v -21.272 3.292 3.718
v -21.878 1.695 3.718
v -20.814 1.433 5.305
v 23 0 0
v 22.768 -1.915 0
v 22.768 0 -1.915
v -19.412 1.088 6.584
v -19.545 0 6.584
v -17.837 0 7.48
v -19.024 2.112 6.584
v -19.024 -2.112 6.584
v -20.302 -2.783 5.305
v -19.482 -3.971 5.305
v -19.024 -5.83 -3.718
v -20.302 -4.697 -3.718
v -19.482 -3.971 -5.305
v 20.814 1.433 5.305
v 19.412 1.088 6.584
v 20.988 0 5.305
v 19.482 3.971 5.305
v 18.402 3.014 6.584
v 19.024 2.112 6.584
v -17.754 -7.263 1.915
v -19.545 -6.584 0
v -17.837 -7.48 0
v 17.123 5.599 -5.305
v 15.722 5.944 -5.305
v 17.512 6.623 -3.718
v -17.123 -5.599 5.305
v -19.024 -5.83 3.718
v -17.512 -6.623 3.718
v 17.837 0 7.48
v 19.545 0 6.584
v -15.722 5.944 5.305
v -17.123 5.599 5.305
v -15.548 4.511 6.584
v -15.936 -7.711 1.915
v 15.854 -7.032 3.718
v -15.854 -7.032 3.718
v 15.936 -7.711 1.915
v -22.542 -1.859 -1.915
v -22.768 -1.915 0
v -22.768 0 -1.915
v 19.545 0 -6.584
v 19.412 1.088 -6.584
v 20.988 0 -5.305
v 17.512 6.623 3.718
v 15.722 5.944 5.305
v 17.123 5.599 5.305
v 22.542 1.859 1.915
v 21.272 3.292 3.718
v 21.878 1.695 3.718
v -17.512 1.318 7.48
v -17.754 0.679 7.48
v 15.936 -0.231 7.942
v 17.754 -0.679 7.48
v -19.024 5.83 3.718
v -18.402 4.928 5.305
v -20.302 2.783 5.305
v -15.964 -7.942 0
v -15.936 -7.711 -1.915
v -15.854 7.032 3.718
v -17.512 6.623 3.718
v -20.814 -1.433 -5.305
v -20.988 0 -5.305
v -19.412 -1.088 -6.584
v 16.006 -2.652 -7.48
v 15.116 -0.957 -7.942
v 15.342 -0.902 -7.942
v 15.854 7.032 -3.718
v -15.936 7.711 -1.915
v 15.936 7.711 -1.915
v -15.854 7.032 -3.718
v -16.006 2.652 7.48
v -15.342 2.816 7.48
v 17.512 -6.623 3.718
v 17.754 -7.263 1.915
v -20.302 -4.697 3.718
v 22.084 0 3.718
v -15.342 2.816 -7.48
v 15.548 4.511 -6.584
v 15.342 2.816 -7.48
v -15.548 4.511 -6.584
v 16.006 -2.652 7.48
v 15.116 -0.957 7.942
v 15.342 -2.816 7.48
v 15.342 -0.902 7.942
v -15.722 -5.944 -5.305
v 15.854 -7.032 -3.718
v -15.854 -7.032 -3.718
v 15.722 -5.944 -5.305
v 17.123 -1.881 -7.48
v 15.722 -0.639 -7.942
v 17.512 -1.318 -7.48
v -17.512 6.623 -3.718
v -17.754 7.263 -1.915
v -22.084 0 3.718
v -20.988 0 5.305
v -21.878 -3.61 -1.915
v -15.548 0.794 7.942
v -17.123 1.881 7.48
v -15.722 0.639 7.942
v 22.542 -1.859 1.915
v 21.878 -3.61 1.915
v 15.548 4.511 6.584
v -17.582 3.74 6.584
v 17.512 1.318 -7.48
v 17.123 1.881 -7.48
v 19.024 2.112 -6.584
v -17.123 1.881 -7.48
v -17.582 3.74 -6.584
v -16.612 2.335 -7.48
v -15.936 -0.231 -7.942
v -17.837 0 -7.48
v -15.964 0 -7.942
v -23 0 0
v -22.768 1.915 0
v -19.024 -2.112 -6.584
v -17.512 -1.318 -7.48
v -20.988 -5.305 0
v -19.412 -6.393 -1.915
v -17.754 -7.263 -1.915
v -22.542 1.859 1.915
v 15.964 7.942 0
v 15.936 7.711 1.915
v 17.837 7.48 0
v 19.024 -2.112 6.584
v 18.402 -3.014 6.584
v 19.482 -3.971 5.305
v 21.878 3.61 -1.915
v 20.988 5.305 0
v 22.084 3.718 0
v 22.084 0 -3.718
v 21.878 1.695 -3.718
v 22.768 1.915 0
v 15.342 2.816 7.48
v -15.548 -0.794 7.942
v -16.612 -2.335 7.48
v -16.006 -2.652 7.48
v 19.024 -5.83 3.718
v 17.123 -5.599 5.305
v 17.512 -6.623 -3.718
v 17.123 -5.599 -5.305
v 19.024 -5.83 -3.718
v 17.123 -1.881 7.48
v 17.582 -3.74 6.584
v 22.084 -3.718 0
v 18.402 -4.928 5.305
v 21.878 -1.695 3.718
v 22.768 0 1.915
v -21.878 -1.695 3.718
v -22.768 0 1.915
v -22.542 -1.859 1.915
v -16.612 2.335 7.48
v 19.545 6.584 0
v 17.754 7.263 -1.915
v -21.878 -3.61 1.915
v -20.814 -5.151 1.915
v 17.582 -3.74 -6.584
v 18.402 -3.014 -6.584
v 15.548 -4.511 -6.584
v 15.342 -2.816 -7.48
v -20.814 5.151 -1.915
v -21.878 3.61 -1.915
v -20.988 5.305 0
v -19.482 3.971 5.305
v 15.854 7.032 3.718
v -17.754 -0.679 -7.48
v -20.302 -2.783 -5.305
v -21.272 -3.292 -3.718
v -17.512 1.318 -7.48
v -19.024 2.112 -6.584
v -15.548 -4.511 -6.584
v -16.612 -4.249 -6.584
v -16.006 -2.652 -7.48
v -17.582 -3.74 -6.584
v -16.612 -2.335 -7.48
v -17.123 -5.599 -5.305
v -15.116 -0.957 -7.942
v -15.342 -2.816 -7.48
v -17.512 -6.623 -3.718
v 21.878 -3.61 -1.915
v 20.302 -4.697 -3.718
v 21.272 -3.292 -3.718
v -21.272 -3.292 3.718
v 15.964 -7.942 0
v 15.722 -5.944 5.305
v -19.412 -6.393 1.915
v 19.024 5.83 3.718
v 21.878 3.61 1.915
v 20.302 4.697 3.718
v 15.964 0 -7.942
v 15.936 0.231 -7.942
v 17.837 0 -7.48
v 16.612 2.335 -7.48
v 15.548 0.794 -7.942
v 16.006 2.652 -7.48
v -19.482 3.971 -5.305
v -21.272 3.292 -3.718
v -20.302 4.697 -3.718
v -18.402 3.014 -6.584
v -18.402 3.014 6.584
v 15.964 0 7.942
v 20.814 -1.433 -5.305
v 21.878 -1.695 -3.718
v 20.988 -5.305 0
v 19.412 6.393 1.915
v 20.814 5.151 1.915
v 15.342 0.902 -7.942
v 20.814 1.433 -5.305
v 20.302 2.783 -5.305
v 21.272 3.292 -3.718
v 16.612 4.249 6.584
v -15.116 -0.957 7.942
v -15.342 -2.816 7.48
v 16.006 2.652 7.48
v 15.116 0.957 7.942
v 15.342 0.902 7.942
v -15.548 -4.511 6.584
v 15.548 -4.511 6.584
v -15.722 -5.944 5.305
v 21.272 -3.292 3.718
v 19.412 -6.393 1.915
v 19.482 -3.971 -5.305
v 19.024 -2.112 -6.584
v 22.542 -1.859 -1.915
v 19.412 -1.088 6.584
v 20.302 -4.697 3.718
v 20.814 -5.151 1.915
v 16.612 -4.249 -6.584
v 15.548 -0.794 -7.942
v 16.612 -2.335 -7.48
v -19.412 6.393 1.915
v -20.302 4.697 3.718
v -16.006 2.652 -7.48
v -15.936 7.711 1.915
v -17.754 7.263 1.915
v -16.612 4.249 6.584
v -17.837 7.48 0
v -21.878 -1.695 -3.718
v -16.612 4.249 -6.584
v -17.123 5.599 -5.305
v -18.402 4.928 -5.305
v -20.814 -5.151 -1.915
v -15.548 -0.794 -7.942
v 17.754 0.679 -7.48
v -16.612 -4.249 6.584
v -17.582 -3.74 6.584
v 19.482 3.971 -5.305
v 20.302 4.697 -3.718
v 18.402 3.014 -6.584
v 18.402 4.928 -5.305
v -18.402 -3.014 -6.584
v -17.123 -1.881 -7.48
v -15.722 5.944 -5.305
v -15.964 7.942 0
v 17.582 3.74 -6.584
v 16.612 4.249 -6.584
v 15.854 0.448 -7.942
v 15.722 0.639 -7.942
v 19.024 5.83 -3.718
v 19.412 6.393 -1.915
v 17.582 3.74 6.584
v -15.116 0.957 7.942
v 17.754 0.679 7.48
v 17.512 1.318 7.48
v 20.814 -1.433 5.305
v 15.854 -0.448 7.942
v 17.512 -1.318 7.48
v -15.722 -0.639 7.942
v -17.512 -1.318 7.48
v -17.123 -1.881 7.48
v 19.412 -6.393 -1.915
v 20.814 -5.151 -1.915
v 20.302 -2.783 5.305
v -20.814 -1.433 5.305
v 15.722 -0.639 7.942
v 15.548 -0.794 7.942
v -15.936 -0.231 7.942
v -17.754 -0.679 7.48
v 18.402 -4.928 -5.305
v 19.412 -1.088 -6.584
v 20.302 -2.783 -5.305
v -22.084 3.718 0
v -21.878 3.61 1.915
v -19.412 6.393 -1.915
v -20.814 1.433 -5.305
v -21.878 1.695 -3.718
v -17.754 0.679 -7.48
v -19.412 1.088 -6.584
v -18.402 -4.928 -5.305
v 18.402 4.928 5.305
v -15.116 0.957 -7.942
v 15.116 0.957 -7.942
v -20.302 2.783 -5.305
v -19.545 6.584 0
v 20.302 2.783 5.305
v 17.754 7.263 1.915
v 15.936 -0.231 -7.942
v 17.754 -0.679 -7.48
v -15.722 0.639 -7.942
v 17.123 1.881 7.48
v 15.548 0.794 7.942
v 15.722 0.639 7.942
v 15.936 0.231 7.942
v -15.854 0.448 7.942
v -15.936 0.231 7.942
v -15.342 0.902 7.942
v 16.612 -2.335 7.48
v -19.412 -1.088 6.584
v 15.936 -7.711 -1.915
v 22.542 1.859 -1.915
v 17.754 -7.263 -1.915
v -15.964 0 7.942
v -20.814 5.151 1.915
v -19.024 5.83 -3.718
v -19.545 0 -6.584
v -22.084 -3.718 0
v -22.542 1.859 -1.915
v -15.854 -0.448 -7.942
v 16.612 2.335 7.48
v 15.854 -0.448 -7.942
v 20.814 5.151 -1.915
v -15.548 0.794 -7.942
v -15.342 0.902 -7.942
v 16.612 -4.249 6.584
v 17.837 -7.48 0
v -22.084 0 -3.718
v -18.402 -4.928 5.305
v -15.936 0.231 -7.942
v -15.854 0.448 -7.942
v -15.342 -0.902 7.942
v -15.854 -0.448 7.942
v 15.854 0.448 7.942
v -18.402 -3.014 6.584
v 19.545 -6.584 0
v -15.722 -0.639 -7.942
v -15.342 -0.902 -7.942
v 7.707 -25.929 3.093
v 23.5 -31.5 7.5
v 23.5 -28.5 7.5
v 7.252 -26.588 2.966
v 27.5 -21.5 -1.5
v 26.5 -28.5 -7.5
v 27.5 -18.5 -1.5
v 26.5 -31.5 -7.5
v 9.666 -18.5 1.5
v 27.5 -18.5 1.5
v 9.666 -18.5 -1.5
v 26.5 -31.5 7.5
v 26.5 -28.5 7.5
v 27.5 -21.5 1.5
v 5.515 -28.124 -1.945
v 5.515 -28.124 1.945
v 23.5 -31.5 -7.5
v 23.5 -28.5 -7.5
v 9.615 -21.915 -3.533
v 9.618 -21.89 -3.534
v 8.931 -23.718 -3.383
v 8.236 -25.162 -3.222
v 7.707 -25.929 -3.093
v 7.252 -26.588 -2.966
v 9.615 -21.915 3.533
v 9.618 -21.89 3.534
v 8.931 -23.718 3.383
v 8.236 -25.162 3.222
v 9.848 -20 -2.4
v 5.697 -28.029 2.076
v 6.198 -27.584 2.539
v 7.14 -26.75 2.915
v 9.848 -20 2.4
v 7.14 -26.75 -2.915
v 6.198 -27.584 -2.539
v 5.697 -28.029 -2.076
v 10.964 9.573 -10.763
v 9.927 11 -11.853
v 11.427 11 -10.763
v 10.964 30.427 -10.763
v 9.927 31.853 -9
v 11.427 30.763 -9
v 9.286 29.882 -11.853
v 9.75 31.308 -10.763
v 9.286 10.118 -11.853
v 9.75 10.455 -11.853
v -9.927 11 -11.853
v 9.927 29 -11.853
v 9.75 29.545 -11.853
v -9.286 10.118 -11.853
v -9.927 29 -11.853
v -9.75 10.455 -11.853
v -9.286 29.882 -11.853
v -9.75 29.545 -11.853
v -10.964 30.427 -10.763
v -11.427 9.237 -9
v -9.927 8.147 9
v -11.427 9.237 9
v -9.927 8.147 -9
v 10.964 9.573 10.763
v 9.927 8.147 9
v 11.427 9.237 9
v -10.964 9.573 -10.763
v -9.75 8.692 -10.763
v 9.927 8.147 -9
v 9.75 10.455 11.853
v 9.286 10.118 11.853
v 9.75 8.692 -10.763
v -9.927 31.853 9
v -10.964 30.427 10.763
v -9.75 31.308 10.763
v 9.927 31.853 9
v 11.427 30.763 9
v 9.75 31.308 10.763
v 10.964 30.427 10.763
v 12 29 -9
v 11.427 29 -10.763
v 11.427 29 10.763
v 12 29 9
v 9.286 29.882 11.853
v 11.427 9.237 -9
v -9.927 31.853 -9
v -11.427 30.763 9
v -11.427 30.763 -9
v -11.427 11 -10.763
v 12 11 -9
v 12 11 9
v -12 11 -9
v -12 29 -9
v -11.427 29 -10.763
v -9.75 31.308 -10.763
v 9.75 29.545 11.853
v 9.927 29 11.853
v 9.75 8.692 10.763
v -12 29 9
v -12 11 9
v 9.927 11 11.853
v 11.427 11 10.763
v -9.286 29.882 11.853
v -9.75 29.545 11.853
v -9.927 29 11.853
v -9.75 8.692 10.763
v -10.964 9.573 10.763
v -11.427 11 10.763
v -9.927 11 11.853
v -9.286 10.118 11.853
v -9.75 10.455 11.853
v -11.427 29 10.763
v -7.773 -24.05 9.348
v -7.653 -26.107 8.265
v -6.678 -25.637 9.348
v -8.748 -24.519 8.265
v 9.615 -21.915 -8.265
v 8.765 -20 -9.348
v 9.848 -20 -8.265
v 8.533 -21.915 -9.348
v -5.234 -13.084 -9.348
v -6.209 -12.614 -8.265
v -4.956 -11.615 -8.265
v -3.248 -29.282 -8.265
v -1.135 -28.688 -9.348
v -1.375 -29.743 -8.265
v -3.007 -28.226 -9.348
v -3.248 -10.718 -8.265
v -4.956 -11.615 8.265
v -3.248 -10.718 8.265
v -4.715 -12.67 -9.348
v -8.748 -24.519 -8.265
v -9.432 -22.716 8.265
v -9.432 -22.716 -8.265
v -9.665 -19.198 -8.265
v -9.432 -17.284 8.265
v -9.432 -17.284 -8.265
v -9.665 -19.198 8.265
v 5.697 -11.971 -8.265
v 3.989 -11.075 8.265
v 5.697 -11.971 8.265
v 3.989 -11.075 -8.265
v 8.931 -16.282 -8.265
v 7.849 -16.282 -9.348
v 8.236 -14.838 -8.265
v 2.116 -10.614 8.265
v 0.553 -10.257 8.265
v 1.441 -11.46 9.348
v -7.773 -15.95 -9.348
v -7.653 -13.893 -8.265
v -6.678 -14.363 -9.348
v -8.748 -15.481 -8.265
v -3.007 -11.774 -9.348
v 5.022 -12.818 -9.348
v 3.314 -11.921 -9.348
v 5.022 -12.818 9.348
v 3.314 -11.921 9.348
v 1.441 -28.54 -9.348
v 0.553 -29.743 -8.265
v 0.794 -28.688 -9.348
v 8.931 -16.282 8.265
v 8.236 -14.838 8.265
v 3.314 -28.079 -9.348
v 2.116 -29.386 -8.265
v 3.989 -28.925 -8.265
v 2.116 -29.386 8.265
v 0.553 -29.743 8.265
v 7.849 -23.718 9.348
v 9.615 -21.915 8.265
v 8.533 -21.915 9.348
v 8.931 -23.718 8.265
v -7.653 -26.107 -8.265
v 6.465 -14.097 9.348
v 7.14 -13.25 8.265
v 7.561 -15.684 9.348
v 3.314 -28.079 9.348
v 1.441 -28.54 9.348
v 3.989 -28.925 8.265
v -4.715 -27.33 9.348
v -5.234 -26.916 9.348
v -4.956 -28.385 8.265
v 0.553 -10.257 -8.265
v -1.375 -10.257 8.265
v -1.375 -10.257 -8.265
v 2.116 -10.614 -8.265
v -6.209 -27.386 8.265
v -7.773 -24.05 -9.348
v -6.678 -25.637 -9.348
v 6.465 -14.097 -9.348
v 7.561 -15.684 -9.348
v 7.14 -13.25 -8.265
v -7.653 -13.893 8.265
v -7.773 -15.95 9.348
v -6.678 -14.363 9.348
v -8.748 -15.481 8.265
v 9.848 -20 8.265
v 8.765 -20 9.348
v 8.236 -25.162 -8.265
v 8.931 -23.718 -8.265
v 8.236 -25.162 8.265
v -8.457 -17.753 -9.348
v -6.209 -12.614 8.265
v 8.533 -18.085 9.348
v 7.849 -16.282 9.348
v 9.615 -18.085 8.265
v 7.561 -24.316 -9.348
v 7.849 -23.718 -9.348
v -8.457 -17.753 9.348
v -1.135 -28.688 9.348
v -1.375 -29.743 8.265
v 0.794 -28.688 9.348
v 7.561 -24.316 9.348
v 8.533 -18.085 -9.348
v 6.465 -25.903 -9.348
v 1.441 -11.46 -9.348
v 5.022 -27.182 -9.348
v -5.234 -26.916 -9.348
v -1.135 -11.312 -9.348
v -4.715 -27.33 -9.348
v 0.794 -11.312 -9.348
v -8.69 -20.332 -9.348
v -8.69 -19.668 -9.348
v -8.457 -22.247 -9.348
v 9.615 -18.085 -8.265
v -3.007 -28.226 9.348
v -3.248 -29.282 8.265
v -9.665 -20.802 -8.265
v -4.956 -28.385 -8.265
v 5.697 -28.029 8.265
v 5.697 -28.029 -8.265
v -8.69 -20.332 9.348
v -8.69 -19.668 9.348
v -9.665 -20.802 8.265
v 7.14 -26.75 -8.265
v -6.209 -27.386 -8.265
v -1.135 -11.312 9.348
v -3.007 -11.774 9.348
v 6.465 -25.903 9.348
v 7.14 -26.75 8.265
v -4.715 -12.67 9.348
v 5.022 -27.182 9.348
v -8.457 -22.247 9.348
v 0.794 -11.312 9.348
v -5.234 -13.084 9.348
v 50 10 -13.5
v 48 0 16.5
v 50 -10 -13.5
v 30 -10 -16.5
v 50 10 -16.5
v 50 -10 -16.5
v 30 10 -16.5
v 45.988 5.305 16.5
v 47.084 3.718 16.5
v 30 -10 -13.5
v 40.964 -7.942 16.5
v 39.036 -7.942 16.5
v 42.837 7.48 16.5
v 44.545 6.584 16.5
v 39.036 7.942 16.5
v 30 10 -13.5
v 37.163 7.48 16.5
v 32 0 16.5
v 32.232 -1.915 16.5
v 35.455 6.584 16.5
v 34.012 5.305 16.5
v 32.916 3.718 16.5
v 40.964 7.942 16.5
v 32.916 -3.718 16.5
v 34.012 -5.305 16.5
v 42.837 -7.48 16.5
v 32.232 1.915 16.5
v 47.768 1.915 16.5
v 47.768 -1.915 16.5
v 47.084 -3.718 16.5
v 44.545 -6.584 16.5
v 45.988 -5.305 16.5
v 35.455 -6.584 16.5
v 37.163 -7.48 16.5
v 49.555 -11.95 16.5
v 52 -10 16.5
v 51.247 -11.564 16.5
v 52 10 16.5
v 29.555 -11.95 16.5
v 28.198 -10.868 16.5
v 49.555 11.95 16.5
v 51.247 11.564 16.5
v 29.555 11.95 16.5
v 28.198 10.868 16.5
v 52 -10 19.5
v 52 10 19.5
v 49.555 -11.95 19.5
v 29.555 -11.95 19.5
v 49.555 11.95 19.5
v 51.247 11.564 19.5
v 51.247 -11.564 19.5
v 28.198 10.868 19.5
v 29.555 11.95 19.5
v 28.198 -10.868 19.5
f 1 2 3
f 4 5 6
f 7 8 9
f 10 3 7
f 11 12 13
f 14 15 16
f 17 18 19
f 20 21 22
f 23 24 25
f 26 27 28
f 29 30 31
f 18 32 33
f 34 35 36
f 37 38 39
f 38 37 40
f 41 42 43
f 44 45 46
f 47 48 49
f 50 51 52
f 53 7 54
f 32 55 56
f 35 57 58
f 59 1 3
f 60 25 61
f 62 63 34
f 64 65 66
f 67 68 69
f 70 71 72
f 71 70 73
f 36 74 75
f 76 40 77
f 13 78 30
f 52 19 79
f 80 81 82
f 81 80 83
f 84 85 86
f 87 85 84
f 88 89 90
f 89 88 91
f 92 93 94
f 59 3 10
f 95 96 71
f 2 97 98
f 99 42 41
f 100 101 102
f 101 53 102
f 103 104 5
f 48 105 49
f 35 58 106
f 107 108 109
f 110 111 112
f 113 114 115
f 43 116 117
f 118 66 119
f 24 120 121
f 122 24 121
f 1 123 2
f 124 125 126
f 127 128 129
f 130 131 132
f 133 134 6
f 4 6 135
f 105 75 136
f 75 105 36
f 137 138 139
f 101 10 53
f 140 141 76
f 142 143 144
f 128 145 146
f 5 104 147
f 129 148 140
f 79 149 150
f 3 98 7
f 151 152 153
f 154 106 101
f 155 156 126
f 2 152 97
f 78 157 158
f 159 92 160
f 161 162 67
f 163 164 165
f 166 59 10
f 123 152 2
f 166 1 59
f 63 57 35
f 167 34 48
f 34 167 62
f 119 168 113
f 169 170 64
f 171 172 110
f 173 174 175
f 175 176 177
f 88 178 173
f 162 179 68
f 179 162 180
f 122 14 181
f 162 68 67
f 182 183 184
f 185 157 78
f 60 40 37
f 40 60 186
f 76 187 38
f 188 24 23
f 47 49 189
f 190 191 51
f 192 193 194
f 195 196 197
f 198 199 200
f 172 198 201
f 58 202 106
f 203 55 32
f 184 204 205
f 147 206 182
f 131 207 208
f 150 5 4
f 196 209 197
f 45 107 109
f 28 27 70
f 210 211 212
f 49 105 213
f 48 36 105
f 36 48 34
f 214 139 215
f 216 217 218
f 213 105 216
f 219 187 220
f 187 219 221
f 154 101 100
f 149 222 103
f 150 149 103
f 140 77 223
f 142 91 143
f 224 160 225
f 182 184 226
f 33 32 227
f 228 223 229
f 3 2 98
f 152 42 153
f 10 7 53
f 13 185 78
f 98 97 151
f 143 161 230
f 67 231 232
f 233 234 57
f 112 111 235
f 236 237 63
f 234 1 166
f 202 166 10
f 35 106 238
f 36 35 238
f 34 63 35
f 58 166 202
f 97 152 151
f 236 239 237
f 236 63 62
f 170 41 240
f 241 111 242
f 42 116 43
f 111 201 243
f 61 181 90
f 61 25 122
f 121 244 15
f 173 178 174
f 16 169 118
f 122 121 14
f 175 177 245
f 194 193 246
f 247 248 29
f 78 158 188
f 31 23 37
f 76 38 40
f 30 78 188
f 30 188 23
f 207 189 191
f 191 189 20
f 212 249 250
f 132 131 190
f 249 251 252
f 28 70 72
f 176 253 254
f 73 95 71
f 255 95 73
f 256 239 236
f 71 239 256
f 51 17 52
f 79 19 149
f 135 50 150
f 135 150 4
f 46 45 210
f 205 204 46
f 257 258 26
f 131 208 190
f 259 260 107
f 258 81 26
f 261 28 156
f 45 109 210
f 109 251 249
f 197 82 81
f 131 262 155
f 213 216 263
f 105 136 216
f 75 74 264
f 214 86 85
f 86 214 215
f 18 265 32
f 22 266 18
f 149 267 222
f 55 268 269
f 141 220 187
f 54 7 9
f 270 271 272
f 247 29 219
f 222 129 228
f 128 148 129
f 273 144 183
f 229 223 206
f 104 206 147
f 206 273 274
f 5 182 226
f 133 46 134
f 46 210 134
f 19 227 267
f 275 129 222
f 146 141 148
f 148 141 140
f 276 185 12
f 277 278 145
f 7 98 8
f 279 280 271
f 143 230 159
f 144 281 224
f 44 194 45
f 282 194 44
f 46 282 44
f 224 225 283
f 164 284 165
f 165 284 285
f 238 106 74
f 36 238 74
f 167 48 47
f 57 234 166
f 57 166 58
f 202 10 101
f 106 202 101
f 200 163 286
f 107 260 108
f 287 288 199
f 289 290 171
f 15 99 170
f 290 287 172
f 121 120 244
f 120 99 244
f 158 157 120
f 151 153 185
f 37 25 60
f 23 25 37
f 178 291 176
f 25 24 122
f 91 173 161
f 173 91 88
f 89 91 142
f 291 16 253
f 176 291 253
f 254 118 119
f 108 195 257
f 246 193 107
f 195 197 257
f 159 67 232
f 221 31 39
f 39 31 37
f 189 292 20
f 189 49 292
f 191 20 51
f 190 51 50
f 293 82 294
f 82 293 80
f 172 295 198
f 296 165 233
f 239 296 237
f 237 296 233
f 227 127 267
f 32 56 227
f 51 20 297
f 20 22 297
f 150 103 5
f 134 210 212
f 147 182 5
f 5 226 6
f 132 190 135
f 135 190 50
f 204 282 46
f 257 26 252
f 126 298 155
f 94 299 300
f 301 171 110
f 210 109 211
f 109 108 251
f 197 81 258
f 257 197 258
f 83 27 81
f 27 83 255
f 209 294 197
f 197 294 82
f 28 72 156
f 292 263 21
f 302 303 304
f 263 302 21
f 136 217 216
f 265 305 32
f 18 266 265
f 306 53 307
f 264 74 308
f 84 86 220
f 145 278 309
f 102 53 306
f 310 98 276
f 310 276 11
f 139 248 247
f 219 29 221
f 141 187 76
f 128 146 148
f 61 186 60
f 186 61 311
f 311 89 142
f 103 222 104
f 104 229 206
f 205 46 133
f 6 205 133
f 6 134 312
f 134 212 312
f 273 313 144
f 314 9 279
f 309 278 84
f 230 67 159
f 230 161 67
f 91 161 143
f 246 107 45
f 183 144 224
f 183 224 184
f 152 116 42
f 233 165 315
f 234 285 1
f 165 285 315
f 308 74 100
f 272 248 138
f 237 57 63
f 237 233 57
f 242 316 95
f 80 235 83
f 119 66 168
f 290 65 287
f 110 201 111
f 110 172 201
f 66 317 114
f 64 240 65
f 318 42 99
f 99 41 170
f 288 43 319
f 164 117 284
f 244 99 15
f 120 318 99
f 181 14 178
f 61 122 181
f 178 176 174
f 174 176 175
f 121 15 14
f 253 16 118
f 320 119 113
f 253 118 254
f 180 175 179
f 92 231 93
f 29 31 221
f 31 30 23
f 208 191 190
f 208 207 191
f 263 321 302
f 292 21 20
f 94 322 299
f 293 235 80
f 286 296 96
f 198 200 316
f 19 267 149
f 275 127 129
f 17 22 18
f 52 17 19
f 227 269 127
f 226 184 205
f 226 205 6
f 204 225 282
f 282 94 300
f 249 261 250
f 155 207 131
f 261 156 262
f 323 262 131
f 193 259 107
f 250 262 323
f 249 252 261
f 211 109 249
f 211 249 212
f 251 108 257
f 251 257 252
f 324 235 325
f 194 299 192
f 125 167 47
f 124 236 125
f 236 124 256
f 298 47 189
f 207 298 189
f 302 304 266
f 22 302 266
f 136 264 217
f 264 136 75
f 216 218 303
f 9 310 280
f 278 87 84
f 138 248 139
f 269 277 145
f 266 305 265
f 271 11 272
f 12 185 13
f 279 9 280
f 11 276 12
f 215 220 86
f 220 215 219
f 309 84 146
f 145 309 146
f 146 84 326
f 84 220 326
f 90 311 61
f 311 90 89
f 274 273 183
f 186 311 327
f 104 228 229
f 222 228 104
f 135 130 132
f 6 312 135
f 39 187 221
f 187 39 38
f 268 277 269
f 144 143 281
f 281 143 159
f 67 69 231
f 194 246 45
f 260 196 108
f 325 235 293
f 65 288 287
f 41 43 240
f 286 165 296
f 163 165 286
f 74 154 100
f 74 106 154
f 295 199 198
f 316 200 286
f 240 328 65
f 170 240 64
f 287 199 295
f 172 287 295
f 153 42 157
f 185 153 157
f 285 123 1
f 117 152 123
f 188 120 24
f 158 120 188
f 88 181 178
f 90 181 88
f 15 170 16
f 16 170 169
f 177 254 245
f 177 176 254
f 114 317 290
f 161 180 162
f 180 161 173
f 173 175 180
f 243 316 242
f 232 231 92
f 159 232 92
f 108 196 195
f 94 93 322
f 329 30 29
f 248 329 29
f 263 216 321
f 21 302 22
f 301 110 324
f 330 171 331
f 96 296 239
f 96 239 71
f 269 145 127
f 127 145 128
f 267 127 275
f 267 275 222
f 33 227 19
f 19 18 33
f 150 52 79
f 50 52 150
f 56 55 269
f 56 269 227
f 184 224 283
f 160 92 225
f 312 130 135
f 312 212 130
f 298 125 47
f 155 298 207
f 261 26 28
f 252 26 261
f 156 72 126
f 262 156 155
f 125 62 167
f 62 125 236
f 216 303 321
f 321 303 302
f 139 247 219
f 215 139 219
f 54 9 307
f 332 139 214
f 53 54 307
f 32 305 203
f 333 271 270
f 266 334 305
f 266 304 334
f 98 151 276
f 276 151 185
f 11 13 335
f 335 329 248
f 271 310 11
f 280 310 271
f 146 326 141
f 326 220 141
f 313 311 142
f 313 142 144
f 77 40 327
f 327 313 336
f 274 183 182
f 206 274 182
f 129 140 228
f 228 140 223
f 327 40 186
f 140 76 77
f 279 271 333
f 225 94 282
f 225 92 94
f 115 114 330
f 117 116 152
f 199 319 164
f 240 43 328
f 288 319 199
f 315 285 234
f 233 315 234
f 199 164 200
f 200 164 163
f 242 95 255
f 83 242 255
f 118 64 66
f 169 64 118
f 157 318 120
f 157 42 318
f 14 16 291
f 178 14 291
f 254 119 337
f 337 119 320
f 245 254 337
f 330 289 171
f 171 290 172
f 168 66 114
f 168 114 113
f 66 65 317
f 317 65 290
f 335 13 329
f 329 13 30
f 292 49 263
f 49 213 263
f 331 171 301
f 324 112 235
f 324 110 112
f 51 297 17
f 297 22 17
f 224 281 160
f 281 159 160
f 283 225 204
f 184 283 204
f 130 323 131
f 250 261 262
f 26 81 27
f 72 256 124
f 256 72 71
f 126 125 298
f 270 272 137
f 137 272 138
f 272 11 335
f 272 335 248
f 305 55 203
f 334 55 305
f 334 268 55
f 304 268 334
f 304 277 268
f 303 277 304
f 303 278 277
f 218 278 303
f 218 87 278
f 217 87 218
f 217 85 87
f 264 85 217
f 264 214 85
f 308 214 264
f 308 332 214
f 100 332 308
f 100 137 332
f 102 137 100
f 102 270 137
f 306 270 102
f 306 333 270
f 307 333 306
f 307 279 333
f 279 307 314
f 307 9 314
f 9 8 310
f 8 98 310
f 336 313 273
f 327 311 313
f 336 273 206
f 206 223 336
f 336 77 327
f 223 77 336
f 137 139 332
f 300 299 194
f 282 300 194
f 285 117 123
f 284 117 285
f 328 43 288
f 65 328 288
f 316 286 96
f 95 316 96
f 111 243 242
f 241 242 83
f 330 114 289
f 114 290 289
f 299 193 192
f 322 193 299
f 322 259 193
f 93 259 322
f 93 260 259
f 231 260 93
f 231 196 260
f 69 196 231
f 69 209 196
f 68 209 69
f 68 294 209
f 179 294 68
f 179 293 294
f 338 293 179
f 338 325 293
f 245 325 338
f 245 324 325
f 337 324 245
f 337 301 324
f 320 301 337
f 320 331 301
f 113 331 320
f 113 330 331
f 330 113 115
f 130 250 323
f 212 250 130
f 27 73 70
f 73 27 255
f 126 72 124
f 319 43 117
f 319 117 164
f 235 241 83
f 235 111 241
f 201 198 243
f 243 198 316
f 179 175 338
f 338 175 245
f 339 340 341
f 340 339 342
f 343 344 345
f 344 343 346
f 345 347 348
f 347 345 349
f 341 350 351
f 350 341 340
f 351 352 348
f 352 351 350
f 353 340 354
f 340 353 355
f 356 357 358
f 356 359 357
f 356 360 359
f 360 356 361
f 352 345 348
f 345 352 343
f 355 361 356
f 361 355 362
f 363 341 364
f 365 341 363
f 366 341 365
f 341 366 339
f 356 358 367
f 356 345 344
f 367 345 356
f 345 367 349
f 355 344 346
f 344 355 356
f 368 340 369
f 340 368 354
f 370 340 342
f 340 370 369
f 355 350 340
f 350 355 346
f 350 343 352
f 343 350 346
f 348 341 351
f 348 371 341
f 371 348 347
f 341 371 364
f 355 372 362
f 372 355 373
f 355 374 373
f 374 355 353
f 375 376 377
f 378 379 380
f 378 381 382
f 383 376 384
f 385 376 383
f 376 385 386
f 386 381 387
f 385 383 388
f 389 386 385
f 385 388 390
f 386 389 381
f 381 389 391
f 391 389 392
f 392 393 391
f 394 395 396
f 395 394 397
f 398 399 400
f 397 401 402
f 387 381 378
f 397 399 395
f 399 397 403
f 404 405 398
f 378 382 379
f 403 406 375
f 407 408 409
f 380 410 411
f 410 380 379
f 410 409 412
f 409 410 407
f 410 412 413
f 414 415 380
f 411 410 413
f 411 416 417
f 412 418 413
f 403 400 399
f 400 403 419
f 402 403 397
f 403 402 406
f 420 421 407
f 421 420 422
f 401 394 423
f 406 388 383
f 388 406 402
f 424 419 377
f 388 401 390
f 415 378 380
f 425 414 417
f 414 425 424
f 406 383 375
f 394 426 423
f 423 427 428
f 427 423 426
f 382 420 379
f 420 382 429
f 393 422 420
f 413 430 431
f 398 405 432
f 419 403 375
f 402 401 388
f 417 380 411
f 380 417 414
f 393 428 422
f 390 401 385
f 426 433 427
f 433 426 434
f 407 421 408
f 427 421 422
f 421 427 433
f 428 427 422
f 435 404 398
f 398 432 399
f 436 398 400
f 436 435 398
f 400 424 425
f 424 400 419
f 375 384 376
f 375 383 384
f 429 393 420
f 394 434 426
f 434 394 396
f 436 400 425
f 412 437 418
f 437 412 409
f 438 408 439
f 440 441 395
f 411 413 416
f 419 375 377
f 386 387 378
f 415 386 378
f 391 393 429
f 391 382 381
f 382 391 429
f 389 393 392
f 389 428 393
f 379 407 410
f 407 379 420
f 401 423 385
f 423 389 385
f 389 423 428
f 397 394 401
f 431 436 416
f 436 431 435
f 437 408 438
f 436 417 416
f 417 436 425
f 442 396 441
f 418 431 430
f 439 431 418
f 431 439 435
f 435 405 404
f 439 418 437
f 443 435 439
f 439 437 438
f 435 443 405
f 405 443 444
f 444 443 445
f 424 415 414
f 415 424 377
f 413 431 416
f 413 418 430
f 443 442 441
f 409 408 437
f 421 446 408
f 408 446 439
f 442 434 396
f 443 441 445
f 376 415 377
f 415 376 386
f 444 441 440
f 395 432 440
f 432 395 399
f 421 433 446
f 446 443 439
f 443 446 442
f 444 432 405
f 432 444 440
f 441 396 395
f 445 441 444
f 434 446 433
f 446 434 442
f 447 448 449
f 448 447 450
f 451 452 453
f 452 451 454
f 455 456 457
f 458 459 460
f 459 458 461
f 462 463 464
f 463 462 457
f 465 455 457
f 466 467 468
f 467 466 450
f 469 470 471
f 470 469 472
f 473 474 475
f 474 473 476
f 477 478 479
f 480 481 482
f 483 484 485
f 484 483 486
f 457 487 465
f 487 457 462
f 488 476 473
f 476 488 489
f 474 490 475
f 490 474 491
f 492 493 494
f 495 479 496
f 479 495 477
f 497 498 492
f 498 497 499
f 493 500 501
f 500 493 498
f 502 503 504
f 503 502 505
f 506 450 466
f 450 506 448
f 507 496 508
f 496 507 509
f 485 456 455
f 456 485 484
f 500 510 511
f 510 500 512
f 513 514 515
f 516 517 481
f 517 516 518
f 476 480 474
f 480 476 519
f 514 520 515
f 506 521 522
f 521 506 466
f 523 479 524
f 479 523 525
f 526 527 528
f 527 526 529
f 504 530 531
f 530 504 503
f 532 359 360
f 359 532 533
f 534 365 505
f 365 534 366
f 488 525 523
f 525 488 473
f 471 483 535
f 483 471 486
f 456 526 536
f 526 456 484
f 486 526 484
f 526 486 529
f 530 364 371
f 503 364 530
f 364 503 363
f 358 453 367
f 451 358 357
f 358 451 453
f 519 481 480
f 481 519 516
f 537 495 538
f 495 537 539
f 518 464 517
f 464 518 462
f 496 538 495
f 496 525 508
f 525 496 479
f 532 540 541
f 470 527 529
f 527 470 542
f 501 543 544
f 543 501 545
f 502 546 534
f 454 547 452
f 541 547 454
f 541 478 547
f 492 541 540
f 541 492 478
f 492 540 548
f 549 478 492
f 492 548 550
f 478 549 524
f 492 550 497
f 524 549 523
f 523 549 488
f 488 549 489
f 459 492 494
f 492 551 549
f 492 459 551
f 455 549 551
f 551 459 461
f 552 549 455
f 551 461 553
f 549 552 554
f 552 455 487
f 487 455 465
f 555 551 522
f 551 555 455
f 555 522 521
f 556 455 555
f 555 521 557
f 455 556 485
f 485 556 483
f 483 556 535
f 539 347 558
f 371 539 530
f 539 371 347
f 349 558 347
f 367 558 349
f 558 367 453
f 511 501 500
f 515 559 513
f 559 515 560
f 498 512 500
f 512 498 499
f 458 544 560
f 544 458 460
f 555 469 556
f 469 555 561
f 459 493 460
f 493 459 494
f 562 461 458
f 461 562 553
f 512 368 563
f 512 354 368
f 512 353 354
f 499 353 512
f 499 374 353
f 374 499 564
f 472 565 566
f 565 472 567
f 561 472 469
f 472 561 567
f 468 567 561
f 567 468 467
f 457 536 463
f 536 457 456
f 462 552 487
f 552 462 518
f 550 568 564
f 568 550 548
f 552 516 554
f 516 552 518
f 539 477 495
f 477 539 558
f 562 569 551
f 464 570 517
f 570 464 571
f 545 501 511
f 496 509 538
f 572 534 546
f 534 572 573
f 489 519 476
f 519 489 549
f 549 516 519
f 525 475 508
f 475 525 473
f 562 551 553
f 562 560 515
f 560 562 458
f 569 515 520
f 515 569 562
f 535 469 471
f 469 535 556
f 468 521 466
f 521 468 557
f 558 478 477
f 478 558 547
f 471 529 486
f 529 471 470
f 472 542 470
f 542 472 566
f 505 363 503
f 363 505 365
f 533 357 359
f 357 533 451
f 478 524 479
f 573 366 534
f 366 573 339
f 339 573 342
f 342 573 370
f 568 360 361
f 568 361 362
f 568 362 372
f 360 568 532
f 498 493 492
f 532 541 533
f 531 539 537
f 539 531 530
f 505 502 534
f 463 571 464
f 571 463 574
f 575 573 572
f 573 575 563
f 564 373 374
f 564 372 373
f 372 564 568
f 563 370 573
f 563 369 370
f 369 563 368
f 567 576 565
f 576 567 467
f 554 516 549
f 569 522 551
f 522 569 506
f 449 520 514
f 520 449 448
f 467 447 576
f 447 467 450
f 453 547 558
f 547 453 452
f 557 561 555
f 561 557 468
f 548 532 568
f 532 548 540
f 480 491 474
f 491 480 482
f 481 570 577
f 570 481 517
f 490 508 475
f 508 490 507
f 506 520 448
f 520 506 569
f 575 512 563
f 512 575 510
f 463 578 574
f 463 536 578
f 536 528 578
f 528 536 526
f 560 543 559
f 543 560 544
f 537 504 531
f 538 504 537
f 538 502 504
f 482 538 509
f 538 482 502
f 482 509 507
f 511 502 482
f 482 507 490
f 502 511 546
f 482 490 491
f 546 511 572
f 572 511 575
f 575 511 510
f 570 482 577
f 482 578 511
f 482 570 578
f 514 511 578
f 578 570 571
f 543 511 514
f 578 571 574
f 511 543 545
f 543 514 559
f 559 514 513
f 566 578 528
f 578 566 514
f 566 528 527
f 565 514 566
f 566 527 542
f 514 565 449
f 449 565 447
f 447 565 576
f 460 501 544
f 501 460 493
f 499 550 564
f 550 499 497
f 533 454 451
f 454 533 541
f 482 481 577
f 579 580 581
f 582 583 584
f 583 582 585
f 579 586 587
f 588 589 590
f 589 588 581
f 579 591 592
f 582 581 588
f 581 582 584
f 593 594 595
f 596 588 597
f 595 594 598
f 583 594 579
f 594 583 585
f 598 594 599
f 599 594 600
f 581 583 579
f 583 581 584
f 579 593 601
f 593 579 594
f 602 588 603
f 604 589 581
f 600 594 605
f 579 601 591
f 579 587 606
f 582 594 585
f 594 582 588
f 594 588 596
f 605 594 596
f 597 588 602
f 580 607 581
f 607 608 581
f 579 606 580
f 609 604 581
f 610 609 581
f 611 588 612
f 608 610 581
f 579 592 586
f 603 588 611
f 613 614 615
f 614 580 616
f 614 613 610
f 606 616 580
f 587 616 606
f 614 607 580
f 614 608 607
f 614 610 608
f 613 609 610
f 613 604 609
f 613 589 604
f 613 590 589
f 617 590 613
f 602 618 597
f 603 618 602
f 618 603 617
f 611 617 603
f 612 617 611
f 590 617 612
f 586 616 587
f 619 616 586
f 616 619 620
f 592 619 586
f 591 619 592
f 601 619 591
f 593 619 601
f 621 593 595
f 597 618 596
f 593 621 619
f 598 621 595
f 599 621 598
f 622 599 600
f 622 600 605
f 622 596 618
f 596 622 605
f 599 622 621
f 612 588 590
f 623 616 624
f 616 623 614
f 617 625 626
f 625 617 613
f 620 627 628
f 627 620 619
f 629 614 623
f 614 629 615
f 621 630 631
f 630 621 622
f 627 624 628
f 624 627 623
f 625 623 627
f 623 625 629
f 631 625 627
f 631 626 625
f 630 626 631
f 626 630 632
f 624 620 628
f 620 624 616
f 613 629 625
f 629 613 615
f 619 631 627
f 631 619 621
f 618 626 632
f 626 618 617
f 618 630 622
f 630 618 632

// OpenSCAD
// tutorial/basic/07_hull_and_minkowski.scad
// ==============================================
// 学习目标: 掌握 hull() 和 minkowski() 变换
// hull()   — 凸包,连接多个对象的最小凸形状
// minkowski() — 闵可夫斯基和,形状"膨胀"

// ---- hull() 示例 ----
module hull_demo() {
    // 用 hull 创建连接两个球体的哑铃
    translate([-15, 0, 0]) {
        hull() {
            sphere(r = 8);
            translate([30, 0, 0]) sphere(r = 8);
        }

        // 两端装饰球
        sphere(r = 8);
        translate([30, 0, 0]) sphere(r = 8);
    }

    // hull 连接多个点,创建不规则形状
    translate([15, -25, 0]) {
        hull() {
            translate([0, 5, 0])  cube([25, 3, 3], center = true);
            translate([10, -5, 0]) cube([3, 3, 15], center = true);
            translate([-10, 0, 0]) cylinder(r = 3, h = 3, center = true);
        }
    }
}

// ---- minkowski() 示例 ----
module minkowski_demo() {
    // 圆角立方体: minkowski(cube, sphere)
    translate([0, 20, 0])
        minkowski() {
            cube([18, 18, 18], center = true);
            sphere(r = 3);
        }

    // 圆角圆柱体
    translate([0, -20, 0])
        minkowski() {
            cylinder(r = 8, h = 15, center = true);
            sphere(r = 2);
        }
}

// ---- 综合应用: 创建连接器 ----
module connector() {
    translate([40, 0, 0]) {
        // 方形到圆形的过渡
        hull() {
            // 方形底座
            translate([0, 0, -15]) cube([20, 20, 3], center = true);
            // 圆形顶部
            translate([0, 0, 15]) cylinder(r = 8, h = 3, center = true);
        }

        // 顶部法兰 (minkowski 圆角)
        translate([0, 0, 18])
            minkowski() {
                cube([20, 20, 2], center = true);
                cylinder(r = 2, h = 1, center = true);
            }
    }
}

hull_demo();
minkowski_demo();
connector();
